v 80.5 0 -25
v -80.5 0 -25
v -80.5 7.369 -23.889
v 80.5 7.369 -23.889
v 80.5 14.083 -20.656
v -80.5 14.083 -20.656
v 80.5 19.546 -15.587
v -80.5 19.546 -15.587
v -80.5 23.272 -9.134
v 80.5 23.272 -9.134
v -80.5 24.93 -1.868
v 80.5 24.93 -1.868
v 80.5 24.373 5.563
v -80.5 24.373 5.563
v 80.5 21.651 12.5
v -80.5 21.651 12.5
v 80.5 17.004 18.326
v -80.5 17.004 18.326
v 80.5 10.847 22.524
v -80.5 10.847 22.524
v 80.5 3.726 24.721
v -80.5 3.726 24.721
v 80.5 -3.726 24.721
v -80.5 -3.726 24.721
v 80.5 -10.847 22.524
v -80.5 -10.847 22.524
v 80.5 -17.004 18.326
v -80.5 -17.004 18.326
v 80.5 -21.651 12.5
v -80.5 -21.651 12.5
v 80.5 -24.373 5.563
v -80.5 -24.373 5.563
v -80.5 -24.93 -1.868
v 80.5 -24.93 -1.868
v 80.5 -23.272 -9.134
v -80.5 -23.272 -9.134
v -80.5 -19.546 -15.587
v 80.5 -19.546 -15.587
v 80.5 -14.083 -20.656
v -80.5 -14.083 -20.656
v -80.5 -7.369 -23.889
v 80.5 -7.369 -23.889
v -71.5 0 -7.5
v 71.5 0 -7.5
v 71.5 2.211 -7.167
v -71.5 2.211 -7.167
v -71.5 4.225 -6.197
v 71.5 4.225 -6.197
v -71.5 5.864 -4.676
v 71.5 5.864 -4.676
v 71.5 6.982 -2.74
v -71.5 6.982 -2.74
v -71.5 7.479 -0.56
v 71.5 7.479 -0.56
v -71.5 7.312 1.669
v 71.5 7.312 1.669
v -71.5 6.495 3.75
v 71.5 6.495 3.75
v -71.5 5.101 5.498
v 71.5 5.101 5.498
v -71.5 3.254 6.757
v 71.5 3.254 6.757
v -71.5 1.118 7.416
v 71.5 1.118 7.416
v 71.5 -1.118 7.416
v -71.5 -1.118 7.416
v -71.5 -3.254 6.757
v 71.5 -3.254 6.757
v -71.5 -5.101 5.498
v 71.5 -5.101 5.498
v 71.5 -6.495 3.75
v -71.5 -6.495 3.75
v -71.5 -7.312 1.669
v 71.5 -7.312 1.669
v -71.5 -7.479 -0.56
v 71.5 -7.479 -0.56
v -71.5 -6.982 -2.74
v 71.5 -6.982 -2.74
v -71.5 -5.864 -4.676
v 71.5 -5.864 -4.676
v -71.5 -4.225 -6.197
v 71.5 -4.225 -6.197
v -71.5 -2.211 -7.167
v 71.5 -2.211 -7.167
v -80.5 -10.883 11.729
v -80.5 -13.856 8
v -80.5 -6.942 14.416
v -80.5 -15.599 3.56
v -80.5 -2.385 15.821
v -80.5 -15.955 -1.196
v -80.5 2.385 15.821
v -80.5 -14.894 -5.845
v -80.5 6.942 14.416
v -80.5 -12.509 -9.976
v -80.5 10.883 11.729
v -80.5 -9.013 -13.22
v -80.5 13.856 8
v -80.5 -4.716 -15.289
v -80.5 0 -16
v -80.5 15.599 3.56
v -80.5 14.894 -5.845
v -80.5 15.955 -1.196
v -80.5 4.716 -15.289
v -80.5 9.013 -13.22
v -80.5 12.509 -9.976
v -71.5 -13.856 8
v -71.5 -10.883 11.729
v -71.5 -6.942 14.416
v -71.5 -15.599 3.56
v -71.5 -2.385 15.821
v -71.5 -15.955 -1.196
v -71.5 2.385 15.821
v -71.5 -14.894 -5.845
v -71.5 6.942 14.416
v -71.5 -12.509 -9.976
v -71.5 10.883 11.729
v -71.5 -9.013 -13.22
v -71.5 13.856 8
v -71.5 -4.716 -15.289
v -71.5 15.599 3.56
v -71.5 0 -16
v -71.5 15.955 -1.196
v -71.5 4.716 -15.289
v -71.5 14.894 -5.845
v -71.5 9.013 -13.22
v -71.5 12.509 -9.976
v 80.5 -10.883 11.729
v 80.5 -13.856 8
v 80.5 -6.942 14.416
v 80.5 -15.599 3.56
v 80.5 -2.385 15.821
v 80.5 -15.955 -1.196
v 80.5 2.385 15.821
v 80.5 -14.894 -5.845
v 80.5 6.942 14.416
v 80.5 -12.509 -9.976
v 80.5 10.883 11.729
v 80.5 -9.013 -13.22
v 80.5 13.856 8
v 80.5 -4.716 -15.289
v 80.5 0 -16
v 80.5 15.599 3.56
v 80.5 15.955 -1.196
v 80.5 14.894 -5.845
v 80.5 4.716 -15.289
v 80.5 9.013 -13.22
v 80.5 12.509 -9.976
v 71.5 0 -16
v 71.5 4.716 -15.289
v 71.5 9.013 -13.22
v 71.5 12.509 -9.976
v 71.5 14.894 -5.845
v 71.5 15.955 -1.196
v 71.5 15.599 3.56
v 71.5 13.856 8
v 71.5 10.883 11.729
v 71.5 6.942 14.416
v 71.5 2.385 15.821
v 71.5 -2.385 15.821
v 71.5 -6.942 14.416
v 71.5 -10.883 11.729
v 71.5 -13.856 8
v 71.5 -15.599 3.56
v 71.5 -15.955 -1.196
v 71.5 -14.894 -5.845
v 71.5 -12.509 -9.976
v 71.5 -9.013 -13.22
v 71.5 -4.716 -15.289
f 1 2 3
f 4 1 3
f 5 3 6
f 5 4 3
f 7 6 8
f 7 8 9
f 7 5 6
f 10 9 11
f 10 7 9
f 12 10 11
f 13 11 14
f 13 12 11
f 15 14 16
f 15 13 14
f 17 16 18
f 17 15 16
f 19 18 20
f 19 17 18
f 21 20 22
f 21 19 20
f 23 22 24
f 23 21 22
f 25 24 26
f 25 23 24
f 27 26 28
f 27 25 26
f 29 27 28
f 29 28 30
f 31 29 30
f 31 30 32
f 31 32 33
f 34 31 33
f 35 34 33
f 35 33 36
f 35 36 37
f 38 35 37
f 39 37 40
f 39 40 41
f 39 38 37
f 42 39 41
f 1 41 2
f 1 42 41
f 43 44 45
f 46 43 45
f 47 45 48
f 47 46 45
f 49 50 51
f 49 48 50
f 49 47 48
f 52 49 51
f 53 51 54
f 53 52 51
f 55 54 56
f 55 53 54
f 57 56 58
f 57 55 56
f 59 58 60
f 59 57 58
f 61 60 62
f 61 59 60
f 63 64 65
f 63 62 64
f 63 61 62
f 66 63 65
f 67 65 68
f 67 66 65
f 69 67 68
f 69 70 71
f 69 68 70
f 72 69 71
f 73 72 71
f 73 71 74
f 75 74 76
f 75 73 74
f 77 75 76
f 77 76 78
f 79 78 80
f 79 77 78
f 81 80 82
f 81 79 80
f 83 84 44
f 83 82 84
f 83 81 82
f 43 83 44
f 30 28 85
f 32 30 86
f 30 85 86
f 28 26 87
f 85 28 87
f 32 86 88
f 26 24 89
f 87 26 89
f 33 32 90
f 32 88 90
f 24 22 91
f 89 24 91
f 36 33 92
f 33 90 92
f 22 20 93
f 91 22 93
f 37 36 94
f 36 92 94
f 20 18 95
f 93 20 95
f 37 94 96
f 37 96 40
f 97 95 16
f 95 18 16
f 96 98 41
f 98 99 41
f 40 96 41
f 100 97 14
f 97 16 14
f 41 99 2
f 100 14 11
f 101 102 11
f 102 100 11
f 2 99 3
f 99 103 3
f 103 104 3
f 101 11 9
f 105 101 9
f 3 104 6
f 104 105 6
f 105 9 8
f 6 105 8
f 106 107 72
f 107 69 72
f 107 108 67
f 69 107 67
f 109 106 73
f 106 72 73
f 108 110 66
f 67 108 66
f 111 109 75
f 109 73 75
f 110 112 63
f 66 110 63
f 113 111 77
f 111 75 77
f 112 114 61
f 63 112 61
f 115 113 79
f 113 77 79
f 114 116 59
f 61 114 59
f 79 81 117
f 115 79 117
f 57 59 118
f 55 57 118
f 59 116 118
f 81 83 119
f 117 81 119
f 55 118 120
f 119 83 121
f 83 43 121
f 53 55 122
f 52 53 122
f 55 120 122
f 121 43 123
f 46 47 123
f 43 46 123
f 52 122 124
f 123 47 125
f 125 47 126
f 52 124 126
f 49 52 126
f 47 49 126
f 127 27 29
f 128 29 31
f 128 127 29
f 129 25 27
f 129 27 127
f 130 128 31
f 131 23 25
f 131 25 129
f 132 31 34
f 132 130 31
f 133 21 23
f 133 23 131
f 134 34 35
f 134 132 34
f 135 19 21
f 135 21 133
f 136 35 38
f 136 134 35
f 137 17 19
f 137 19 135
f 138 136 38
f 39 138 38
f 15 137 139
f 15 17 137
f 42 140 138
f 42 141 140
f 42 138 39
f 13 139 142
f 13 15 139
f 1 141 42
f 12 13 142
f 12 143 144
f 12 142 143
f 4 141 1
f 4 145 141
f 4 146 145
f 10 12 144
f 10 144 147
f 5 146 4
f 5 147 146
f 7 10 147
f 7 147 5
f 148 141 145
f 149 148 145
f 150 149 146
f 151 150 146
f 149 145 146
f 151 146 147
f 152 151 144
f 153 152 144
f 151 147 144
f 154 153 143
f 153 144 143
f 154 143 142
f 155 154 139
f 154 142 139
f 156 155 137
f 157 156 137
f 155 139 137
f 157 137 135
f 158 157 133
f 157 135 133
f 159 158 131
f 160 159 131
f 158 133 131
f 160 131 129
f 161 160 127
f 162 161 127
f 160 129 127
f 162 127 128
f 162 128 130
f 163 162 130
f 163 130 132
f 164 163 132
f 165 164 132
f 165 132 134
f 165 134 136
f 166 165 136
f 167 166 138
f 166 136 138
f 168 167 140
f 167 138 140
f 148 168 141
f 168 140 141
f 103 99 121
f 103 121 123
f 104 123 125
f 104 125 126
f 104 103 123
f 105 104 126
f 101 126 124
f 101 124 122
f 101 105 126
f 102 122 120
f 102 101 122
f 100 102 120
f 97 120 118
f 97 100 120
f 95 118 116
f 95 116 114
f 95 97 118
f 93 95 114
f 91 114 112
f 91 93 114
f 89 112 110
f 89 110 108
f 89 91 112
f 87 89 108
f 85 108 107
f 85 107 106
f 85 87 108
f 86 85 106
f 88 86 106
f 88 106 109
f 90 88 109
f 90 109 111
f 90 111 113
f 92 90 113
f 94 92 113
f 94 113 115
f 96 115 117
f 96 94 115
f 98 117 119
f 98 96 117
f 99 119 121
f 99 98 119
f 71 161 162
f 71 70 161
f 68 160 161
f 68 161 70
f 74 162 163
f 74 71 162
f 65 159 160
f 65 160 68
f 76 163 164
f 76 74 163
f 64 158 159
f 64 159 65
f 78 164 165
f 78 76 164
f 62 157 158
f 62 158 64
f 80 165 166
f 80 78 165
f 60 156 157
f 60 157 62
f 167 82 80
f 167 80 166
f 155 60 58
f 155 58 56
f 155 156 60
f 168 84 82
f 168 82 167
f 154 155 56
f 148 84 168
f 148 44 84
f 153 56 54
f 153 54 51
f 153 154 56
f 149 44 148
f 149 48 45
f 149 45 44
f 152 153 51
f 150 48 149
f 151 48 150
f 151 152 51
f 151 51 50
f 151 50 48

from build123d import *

# Parameters (mm, degrees)
IZIM1_R                     = 25
IZIM1_R_2                   = 7.5
Y_KSEKLIK_EKSTR_ZYON1_DEPTH = 80.5
IZIM2_R                     = 16
KES_EKSTR_ZYON1_DEPTH       = 9


with BuildPart() as part:
    # Çizim1 → Yükseklik-Ekstrüzyon1 (new, symmetric)
    with BuildSketch(Plane(origin=(0, 0, 0), x_dir=(0, 0, -1), z_dir=(1, 0, 0))):
        Circle(IZIM1_R)
        Circle(IZIM1_R_2, mode=Mode.SUBTRACT)
    extrude(amount=Y_KSEKLIK_EKSTR_ZYON1_DEPTH, both=True)

    # Çizim2 → Kes-Ekstrüzyon1 (cut)
    with BuildSketch(Plane(origin=(80.5, 0, 0), x_dir=(0, 0, -1), z_dir=(1, 0, 0))):
        Circle(IZIM2_R)
    kes_ekstr_zyon1 = extrude(amount=-KES_EKSTR_ZYON1_DEPTH, mode=Mode.SUBTRACT)

    # Aynalama1: Kes-Ekstrüzyon1 across plane
    add(kes_ekstr_zyon1.mirror(Plane(origin=(0, 0, 0), x_dir=(0, 0, 1), z_dir=(1, 0, 0))), mode=Mode.SUBTRACT)


solid = part.part
